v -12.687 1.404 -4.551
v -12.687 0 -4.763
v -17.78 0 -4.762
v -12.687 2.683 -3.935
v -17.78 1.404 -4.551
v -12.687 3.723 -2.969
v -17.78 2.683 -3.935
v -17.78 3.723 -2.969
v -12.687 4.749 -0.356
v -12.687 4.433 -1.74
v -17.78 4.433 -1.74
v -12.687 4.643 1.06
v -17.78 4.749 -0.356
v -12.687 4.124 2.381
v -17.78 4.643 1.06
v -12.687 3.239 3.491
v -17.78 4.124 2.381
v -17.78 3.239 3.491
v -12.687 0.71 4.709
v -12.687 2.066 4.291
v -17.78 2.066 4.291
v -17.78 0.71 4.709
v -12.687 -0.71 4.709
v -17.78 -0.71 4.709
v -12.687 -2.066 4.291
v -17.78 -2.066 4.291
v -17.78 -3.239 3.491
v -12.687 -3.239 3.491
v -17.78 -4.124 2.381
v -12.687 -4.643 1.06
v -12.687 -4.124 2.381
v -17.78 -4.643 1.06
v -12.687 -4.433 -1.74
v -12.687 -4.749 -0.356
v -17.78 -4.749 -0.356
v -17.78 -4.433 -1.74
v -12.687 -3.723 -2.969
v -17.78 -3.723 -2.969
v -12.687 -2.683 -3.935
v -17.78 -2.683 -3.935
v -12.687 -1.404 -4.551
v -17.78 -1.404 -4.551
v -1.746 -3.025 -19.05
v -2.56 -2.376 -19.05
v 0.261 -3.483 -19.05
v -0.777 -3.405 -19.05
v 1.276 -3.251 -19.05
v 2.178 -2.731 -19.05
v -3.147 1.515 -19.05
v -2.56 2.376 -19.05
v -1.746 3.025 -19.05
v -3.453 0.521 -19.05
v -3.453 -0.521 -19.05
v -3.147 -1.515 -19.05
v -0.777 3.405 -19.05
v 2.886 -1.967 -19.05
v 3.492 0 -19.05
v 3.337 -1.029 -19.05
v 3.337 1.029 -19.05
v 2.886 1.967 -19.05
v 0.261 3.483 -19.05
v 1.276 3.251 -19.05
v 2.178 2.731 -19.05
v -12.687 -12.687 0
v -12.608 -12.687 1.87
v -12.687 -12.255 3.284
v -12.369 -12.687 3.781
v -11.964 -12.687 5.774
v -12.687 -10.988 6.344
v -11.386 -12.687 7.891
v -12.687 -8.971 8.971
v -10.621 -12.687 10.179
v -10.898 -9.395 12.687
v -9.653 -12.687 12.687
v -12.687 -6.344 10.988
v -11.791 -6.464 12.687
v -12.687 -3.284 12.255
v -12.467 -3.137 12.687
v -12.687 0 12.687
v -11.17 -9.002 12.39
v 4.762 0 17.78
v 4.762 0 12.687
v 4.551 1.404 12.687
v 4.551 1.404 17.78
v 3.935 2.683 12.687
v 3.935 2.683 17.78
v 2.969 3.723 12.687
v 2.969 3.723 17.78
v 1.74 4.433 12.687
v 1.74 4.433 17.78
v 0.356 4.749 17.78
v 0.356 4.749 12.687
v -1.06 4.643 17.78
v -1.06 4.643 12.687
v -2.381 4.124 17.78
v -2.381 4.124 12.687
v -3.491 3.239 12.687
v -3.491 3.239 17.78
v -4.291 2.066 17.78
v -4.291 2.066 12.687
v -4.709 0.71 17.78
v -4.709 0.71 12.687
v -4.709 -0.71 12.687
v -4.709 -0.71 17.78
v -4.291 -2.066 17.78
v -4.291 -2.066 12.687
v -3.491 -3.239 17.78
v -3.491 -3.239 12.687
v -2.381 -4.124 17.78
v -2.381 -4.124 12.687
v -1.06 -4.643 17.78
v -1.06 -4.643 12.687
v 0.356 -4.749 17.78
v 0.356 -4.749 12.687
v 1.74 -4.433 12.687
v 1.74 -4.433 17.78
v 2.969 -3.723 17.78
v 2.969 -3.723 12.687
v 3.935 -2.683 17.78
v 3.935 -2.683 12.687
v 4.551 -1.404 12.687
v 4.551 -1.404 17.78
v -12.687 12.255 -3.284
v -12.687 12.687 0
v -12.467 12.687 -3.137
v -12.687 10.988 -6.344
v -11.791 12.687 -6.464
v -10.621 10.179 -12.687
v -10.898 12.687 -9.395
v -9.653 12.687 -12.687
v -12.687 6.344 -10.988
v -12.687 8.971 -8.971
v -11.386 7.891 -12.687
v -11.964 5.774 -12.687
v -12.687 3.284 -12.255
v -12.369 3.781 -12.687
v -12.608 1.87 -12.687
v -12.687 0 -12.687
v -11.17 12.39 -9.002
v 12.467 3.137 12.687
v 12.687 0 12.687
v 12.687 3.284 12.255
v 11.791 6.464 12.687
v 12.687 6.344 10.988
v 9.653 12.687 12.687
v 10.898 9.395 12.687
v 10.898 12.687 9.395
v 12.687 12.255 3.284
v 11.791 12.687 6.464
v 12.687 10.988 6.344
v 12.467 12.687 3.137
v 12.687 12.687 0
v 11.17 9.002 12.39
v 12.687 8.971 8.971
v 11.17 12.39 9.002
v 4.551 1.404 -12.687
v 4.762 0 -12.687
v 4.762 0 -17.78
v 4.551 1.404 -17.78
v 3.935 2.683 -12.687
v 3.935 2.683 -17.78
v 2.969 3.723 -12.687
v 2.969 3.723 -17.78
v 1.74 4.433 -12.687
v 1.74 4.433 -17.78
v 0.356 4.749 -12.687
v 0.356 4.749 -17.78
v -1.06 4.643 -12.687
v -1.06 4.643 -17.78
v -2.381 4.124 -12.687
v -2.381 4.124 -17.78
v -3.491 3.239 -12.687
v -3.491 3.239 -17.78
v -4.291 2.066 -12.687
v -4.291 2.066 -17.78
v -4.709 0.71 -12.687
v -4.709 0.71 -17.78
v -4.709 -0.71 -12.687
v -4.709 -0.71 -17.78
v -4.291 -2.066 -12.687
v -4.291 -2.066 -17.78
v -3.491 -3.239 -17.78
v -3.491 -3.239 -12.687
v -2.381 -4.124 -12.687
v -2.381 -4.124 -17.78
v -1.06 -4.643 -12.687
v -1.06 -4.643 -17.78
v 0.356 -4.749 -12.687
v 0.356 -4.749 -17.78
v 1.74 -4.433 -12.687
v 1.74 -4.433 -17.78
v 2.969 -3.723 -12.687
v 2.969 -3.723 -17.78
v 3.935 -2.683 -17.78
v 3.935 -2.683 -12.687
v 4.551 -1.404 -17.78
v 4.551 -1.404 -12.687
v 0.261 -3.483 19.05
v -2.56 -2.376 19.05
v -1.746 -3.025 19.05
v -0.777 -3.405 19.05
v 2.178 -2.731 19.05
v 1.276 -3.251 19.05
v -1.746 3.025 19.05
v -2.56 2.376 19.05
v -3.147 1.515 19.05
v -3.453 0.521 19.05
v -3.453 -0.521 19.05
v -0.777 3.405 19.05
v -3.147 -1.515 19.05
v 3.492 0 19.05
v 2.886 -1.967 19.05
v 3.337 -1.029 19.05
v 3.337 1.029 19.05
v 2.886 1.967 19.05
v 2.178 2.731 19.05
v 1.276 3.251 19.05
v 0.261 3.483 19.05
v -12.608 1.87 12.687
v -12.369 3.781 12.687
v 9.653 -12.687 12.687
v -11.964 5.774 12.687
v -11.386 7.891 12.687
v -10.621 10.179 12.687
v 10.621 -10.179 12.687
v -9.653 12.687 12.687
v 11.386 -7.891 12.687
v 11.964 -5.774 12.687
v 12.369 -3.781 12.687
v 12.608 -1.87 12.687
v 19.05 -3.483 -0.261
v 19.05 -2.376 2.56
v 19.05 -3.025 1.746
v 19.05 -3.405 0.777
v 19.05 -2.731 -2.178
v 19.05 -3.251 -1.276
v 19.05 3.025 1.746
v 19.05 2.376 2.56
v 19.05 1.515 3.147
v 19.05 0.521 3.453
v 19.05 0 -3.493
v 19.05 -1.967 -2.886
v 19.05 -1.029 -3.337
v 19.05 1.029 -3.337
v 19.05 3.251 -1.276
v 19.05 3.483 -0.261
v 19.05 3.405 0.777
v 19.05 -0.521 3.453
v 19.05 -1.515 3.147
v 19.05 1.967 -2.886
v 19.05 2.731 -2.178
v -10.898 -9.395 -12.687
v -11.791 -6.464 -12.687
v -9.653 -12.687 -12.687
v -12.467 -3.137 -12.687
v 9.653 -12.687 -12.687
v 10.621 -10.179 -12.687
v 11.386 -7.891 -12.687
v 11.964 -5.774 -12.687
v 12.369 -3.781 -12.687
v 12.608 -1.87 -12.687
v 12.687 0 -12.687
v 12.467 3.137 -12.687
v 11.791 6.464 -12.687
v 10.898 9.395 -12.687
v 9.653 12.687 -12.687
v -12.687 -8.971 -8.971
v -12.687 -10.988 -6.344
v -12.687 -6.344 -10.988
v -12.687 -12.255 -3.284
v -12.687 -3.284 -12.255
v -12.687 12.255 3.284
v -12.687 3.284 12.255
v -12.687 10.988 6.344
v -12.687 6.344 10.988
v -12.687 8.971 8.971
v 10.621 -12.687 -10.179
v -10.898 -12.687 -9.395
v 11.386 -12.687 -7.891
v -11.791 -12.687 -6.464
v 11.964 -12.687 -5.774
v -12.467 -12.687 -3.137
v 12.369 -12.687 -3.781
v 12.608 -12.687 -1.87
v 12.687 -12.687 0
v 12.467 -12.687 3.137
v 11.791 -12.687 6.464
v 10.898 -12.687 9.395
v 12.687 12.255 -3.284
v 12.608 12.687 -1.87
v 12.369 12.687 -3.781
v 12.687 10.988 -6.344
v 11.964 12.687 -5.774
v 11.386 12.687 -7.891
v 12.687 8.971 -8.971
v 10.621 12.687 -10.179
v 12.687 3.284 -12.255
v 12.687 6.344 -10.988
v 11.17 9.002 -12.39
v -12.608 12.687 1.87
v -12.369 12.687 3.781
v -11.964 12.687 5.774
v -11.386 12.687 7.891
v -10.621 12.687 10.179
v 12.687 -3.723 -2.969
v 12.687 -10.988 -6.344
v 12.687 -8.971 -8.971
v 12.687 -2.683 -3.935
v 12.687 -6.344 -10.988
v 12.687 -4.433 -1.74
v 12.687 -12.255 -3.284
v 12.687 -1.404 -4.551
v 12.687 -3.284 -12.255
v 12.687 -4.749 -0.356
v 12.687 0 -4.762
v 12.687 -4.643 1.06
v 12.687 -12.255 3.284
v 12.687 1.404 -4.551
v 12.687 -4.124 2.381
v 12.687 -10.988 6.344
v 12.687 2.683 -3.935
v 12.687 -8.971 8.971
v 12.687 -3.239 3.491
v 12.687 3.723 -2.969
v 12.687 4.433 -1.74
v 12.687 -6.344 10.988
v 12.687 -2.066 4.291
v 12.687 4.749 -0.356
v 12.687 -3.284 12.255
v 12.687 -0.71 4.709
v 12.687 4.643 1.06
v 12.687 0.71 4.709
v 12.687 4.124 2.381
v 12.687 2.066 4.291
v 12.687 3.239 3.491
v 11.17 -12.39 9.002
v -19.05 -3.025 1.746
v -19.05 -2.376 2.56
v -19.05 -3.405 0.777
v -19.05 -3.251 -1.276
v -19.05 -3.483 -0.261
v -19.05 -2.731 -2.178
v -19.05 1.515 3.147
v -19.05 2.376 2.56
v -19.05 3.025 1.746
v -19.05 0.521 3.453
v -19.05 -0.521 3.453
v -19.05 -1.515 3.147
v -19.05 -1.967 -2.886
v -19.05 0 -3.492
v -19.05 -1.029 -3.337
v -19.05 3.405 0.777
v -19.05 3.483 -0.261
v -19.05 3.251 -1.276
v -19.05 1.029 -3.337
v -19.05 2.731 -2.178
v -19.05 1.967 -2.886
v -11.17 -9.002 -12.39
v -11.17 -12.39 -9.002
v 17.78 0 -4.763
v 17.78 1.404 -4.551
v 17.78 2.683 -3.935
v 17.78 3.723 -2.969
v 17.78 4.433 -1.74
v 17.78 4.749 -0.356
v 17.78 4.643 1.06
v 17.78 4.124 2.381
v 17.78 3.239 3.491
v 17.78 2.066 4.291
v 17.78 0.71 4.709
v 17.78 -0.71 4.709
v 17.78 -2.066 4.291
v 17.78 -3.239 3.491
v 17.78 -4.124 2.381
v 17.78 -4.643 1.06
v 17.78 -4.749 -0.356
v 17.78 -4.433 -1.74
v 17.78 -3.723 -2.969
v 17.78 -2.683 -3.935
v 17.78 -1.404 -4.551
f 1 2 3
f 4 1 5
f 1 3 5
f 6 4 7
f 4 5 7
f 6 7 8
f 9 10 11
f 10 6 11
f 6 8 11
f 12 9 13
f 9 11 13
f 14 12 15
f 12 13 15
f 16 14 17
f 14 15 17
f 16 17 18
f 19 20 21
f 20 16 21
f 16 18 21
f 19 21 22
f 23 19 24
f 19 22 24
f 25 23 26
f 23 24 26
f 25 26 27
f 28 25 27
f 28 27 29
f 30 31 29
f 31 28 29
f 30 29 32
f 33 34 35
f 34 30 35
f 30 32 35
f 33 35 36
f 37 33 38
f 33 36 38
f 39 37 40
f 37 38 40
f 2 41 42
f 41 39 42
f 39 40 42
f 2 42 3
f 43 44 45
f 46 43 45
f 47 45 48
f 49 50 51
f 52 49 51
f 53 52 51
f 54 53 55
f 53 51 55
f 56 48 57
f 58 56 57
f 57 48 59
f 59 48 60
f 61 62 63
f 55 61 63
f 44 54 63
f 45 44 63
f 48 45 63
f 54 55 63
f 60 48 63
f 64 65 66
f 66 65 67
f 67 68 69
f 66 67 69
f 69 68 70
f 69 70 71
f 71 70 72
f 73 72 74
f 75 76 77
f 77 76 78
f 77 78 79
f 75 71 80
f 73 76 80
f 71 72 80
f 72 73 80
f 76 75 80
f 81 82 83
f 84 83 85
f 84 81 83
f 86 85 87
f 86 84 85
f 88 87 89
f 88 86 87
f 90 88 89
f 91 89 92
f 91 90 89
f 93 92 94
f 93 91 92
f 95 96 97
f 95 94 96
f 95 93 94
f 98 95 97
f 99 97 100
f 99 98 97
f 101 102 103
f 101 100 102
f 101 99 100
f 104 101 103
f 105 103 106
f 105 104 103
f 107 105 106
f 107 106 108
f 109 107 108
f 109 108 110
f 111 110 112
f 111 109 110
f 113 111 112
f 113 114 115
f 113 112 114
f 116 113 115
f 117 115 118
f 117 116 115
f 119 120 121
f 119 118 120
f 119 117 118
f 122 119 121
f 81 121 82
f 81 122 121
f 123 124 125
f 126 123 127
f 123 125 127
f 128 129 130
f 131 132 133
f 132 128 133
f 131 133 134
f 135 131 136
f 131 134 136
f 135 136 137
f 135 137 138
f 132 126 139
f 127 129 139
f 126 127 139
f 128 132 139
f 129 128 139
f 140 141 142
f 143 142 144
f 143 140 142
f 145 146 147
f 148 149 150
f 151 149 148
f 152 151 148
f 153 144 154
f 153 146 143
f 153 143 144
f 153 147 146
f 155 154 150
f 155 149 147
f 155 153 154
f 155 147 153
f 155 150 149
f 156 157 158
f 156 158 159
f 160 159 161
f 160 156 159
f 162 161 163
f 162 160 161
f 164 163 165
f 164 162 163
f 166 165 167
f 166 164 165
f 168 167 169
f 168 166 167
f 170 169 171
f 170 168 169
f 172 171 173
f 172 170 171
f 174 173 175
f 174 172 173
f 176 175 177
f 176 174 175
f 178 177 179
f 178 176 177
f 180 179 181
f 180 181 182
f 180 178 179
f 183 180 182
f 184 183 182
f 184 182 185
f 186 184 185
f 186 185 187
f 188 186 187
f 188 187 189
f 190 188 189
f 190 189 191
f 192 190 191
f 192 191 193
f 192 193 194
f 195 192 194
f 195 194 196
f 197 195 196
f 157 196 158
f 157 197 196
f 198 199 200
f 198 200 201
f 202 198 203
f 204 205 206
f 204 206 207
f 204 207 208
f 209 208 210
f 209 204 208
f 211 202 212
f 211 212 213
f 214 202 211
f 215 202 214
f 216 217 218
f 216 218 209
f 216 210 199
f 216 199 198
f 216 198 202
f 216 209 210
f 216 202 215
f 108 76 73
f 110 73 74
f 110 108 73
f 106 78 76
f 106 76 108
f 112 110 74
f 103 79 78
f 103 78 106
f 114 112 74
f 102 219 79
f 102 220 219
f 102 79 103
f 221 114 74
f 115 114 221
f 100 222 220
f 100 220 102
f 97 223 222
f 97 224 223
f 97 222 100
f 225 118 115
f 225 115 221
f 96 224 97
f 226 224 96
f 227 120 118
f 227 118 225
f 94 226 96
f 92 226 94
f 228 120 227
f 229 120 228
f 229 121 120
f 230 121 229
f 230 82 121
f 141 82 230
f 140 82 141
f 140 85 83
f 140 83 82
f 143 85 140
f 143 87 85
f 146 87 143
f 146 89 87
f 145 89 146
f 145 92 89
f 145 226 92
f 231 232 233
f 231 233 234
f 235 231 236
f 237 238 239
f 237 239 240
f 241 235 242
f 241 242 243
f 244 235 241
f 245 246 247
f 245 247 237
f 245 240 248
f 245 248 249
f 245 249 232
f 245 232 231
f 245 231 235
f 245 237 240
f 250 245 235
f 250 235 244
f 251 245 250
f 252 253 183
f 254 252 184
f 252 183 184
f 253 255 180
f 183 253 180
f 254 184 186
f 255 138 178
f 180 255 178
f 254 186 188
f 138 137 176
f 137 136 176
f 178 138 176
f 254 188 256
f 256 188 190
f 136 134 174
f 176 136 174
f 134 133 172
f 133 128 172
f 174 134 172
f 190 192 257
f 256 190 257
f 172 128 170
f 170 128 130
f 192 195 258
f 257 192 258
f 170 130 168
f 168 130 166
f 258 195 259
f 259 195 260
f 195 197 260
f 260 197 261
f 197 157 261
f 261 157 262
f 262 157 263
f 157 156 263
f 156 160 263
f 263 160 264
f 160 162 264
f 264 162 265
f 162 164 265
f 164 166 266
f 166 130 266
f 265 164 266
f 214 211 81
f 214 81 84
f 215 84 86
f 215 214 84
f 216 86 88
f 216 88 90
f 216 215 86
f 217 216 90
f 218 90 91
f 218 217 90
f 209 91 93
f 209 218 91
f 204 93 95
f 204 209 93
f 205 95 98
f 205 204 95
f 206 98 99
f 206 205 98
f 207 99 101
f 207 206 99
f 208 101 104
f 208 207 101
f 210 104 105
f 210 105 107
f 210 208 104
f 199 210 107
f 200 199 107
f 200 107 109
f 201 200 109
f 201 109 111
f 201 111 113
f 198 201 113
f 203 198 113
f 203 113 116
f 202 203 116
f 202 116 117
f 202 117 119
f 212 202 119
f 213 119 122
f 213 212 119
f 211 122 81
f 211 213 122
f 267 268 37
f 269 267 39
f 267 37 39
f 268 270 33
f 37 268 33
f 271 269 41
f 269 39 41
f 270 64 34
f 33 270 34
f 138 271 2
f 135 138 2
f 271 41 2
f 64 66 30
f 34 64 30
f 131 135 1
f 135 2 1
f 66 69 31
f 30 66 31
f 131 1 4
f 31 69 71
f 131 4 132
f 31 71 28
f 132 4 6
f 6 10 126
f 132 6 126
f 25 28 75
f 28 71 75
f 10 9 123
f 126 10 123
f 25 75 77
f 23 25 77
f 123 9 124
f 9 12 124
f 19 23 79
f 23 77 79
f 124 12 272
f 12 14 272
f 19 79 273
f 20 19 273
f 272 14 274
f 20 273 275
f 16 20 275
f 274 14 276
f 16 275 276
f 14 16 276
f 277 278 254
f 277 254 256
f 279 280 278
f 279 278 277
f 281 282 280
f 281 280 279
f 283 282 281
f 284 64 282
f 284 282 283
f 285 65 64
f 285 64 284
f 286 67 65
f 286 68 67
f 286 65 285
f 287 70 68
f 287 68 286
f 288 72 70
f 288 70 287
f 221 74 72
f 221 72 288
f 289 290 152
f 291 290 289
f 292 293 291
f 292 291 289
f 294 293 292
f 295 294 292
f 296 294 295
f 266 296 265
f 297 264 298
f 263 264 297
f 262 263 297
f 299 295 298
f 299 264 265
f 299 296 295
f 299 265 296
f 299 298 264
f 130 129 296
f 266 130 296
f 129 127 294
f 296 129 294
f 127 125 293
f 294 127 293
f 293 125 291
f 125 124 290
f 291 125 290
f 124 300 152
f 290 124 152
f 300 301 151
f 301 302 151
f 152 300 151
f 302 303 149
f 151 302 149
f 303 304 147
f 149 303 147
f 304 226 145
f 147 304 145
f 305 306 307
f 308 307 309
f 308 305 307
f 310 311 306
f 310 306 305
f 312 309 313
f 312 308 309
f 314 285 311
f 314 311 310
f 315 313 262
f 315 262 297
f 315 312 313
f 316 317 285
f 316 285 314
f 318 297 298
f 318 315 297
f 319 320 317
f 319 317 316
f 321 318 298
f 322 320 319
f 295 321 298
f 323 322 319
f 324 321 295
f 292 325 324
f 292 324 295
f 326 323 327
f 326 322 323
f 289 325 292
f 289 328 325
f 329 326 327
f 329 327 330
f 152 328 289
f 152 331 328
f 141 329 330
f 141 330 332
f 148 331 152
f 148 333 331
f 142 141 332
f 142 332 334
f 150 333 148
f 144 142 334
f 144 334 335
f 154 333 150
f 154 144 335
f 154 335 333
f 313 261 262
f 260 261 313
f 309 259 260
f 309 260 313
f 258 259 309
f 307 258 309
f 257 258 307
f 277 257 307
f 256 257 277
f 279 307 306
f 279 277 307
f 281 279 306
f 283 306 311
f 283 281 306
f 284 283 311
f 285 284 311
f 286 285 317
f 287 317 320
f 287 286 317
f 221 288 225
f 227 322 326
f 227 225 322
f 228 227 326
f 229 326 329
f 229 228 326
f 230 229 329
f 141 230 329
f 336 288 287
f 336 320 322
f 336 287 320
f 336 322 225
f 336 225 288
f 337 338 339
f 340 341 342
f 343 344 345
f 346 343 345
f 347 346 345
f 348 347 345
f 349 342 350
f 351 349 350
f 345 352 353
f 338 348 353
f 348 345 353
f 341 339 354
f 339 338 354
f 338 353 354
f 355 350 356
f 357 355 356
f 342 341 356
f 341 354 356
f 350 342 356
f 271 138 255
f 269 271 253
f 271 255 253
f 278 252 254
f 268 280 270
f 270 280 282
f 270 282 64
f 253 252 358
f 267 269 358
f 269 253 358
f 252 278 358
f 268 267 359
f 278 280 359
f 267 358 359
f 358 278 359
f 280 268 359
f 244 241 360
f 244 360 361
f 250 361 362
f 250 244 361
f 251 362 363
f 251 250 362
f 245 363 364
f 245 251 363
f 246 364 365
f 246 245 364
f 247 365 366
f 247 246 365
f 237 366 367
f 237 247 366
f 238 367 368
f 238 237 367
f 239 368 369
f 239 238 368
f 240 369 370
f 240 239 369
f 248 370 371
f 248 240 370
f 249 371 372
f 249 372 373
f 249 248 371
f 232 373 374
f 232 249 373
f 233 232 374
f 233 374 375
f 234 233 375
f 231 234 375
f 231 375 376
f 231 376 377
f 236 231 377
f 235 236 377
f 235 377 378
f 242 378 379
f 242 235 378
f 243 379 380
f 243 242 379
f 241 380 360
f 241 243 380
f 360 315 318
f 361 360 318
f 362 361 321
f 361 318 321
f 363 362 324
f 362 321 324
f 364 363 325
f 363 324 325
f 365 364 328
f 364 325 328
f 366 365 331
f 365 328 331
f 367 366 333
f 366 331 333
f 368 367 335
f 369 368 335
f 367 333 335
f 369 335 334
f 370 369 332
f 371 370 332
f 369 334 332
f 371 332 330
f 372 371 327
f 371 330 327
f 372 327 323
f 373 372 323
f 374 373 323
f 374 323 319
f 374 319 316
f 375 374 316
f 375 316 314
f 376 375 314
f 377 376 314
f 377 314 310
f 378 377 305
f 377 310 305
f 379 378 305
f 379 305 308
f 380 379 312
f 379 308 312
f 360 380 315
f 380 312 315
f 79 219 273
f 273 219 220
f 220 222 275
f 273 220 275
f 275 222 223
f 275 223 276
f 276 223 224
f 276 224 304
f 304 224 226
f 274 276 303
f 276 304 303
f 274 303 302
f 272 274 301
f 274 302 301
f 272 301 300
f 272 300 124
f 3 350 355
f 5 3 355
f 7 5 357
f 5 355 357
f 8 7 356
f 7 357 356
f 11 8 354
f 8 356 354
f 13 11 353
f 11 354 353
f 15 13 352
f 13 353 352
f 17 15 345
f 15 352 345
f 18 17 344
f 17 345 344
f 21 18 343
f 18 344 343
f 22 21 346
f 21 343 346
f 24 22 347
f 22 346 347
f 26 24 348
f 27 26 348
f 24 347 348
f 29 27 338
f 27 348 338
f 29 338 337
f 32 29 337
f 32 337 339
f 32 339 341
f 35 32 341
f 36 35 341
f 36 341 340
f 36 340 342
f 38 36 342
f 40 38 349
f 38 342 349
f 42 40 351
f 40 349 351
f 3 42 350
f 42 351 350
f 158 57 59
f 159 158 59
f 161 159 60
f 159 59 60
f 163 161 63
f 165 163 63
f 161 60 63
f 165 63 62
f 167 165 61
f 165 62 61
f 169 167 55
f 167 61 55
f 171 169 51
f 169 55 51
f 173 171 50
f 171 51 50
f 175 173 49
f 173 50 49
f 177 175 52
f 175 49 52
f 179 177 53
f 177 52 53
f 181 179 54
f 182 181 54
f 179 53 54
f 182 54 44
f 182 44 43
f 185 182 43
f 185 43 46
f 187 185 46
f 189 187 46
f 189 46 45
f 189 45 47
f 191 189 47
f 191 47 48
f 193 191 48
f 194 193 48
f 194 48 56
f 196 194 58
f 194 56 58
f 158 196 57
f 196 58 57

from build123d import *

# Parameters (mm, degrees)
SKETCH1_W               = 25.3746
SKETCH1_H               = 25.3746
BOSS_EXTRUDE1_DEPTH     = 12.6873
SKETCH2_OUTSIDE_W       = 127.528
SKETCH2_OUTSIDE_H       = 127.528
SKETCH2_OUTSIDE_R       = 12.6873
CUT_EXTRUDE1_DEPTH      = 26.3746
CUT_EXTRUDE1_TAPER      = 60
SKETCH3_R               = 4.7625
CUT_EXTRUDE2_DEPTH      = 13.6873
CUT_EXTRUDE2_DEPTH_BACK = 13.6873
SKETCH3_2_R             = 4.7625
BOSS_EXTRUDE3_DEPTH     = 19.05
CHAMFER6_SIZE           = 1.27


with BuildPart() as part:
    # Sketch1 → Boss-Extrude1 (new body, symmetric)
    with BuildSketch(Plane.XY):
        Rectangle(SKETCH1_W, SKETCH1_H)
    extrude(amount=BOSS_EXTRUDE1_DEPTH, both=True)

    # Sketch2 outside → Cut-Extrude1 (cut, through all)
    with BuildSketch(Plane(origin=(12.6873, 0, 0), x_dir=(0, 0, -1), z_dir=(1, 0, 0))):
        Rectangle(SKETCH2_OUTSIDE_W, SKETCH2_OUTSIDE_H)
        Circle(SKETCH2_OUTSIDE_R, mode=Mode.SUBTRACT)
    cut_extrude1 = extrude(amount=-CUT_EXTRUDE1_DEPTH, taper=CUT_EXTRUDE1_TAPER, mode=Mode.SUBTRACT)

    # Mirror1: Cut-Extrude1 across plane
    add(cut_extrude1.mirror(Plane(origin=(0, 0, 0), x_dir=(0, 0, 1), z_dir=(1, 0, 0))), mode=Mode.SUBTRACT)

    # Sketch3 → Cut-Extrude2 (cut, two sides)
    with BuildSketch(Plane.XY) as cut_extrude2_sk:
        Circle(SKETCH3_R)
    extrude(amount=CUT_EXTRUDE2_DEPTH, mode=Mode.SUBTRACT)
    extrude(cut_extrude2_sk.sketch, amount=-CUT_EXTRUDE2_DEPTH_BACK, mode=Mode.SUBTRACT)

    # Sketch3<2> → Boss-Extrude3 (add, symmetric)
    with BuildSketch(Plane.XY):
        Circle(SKETCH3_2_R)
    boss_extrude3 = extrude(amount=BOSS_EXTRUDE3_DEPTH, both=True)

    # Mirror2: Boss-Extrude3 across plane
    add(boss_extrude3.mirror(Plane(origin=(0, 0, 0), x_dir=(-0.707106781, 0, 0.707106781), z_dir=(-0.707106781, 0, -0.707106781))))

    # Chamfer6
    chamfer6_edges = [part.edges().sort_by_distance(p)[0] for p in [
        (-4.7625, 0, -19.05),
        (-4.7625, 0, 19.05),
        (-19.05, 0, 4.7625),
        (19.05, 0, 4.7625),
    ]]
    chamfer(chamfer6_edges, length=CHAMFER6_SIZE)


solid = part.part
